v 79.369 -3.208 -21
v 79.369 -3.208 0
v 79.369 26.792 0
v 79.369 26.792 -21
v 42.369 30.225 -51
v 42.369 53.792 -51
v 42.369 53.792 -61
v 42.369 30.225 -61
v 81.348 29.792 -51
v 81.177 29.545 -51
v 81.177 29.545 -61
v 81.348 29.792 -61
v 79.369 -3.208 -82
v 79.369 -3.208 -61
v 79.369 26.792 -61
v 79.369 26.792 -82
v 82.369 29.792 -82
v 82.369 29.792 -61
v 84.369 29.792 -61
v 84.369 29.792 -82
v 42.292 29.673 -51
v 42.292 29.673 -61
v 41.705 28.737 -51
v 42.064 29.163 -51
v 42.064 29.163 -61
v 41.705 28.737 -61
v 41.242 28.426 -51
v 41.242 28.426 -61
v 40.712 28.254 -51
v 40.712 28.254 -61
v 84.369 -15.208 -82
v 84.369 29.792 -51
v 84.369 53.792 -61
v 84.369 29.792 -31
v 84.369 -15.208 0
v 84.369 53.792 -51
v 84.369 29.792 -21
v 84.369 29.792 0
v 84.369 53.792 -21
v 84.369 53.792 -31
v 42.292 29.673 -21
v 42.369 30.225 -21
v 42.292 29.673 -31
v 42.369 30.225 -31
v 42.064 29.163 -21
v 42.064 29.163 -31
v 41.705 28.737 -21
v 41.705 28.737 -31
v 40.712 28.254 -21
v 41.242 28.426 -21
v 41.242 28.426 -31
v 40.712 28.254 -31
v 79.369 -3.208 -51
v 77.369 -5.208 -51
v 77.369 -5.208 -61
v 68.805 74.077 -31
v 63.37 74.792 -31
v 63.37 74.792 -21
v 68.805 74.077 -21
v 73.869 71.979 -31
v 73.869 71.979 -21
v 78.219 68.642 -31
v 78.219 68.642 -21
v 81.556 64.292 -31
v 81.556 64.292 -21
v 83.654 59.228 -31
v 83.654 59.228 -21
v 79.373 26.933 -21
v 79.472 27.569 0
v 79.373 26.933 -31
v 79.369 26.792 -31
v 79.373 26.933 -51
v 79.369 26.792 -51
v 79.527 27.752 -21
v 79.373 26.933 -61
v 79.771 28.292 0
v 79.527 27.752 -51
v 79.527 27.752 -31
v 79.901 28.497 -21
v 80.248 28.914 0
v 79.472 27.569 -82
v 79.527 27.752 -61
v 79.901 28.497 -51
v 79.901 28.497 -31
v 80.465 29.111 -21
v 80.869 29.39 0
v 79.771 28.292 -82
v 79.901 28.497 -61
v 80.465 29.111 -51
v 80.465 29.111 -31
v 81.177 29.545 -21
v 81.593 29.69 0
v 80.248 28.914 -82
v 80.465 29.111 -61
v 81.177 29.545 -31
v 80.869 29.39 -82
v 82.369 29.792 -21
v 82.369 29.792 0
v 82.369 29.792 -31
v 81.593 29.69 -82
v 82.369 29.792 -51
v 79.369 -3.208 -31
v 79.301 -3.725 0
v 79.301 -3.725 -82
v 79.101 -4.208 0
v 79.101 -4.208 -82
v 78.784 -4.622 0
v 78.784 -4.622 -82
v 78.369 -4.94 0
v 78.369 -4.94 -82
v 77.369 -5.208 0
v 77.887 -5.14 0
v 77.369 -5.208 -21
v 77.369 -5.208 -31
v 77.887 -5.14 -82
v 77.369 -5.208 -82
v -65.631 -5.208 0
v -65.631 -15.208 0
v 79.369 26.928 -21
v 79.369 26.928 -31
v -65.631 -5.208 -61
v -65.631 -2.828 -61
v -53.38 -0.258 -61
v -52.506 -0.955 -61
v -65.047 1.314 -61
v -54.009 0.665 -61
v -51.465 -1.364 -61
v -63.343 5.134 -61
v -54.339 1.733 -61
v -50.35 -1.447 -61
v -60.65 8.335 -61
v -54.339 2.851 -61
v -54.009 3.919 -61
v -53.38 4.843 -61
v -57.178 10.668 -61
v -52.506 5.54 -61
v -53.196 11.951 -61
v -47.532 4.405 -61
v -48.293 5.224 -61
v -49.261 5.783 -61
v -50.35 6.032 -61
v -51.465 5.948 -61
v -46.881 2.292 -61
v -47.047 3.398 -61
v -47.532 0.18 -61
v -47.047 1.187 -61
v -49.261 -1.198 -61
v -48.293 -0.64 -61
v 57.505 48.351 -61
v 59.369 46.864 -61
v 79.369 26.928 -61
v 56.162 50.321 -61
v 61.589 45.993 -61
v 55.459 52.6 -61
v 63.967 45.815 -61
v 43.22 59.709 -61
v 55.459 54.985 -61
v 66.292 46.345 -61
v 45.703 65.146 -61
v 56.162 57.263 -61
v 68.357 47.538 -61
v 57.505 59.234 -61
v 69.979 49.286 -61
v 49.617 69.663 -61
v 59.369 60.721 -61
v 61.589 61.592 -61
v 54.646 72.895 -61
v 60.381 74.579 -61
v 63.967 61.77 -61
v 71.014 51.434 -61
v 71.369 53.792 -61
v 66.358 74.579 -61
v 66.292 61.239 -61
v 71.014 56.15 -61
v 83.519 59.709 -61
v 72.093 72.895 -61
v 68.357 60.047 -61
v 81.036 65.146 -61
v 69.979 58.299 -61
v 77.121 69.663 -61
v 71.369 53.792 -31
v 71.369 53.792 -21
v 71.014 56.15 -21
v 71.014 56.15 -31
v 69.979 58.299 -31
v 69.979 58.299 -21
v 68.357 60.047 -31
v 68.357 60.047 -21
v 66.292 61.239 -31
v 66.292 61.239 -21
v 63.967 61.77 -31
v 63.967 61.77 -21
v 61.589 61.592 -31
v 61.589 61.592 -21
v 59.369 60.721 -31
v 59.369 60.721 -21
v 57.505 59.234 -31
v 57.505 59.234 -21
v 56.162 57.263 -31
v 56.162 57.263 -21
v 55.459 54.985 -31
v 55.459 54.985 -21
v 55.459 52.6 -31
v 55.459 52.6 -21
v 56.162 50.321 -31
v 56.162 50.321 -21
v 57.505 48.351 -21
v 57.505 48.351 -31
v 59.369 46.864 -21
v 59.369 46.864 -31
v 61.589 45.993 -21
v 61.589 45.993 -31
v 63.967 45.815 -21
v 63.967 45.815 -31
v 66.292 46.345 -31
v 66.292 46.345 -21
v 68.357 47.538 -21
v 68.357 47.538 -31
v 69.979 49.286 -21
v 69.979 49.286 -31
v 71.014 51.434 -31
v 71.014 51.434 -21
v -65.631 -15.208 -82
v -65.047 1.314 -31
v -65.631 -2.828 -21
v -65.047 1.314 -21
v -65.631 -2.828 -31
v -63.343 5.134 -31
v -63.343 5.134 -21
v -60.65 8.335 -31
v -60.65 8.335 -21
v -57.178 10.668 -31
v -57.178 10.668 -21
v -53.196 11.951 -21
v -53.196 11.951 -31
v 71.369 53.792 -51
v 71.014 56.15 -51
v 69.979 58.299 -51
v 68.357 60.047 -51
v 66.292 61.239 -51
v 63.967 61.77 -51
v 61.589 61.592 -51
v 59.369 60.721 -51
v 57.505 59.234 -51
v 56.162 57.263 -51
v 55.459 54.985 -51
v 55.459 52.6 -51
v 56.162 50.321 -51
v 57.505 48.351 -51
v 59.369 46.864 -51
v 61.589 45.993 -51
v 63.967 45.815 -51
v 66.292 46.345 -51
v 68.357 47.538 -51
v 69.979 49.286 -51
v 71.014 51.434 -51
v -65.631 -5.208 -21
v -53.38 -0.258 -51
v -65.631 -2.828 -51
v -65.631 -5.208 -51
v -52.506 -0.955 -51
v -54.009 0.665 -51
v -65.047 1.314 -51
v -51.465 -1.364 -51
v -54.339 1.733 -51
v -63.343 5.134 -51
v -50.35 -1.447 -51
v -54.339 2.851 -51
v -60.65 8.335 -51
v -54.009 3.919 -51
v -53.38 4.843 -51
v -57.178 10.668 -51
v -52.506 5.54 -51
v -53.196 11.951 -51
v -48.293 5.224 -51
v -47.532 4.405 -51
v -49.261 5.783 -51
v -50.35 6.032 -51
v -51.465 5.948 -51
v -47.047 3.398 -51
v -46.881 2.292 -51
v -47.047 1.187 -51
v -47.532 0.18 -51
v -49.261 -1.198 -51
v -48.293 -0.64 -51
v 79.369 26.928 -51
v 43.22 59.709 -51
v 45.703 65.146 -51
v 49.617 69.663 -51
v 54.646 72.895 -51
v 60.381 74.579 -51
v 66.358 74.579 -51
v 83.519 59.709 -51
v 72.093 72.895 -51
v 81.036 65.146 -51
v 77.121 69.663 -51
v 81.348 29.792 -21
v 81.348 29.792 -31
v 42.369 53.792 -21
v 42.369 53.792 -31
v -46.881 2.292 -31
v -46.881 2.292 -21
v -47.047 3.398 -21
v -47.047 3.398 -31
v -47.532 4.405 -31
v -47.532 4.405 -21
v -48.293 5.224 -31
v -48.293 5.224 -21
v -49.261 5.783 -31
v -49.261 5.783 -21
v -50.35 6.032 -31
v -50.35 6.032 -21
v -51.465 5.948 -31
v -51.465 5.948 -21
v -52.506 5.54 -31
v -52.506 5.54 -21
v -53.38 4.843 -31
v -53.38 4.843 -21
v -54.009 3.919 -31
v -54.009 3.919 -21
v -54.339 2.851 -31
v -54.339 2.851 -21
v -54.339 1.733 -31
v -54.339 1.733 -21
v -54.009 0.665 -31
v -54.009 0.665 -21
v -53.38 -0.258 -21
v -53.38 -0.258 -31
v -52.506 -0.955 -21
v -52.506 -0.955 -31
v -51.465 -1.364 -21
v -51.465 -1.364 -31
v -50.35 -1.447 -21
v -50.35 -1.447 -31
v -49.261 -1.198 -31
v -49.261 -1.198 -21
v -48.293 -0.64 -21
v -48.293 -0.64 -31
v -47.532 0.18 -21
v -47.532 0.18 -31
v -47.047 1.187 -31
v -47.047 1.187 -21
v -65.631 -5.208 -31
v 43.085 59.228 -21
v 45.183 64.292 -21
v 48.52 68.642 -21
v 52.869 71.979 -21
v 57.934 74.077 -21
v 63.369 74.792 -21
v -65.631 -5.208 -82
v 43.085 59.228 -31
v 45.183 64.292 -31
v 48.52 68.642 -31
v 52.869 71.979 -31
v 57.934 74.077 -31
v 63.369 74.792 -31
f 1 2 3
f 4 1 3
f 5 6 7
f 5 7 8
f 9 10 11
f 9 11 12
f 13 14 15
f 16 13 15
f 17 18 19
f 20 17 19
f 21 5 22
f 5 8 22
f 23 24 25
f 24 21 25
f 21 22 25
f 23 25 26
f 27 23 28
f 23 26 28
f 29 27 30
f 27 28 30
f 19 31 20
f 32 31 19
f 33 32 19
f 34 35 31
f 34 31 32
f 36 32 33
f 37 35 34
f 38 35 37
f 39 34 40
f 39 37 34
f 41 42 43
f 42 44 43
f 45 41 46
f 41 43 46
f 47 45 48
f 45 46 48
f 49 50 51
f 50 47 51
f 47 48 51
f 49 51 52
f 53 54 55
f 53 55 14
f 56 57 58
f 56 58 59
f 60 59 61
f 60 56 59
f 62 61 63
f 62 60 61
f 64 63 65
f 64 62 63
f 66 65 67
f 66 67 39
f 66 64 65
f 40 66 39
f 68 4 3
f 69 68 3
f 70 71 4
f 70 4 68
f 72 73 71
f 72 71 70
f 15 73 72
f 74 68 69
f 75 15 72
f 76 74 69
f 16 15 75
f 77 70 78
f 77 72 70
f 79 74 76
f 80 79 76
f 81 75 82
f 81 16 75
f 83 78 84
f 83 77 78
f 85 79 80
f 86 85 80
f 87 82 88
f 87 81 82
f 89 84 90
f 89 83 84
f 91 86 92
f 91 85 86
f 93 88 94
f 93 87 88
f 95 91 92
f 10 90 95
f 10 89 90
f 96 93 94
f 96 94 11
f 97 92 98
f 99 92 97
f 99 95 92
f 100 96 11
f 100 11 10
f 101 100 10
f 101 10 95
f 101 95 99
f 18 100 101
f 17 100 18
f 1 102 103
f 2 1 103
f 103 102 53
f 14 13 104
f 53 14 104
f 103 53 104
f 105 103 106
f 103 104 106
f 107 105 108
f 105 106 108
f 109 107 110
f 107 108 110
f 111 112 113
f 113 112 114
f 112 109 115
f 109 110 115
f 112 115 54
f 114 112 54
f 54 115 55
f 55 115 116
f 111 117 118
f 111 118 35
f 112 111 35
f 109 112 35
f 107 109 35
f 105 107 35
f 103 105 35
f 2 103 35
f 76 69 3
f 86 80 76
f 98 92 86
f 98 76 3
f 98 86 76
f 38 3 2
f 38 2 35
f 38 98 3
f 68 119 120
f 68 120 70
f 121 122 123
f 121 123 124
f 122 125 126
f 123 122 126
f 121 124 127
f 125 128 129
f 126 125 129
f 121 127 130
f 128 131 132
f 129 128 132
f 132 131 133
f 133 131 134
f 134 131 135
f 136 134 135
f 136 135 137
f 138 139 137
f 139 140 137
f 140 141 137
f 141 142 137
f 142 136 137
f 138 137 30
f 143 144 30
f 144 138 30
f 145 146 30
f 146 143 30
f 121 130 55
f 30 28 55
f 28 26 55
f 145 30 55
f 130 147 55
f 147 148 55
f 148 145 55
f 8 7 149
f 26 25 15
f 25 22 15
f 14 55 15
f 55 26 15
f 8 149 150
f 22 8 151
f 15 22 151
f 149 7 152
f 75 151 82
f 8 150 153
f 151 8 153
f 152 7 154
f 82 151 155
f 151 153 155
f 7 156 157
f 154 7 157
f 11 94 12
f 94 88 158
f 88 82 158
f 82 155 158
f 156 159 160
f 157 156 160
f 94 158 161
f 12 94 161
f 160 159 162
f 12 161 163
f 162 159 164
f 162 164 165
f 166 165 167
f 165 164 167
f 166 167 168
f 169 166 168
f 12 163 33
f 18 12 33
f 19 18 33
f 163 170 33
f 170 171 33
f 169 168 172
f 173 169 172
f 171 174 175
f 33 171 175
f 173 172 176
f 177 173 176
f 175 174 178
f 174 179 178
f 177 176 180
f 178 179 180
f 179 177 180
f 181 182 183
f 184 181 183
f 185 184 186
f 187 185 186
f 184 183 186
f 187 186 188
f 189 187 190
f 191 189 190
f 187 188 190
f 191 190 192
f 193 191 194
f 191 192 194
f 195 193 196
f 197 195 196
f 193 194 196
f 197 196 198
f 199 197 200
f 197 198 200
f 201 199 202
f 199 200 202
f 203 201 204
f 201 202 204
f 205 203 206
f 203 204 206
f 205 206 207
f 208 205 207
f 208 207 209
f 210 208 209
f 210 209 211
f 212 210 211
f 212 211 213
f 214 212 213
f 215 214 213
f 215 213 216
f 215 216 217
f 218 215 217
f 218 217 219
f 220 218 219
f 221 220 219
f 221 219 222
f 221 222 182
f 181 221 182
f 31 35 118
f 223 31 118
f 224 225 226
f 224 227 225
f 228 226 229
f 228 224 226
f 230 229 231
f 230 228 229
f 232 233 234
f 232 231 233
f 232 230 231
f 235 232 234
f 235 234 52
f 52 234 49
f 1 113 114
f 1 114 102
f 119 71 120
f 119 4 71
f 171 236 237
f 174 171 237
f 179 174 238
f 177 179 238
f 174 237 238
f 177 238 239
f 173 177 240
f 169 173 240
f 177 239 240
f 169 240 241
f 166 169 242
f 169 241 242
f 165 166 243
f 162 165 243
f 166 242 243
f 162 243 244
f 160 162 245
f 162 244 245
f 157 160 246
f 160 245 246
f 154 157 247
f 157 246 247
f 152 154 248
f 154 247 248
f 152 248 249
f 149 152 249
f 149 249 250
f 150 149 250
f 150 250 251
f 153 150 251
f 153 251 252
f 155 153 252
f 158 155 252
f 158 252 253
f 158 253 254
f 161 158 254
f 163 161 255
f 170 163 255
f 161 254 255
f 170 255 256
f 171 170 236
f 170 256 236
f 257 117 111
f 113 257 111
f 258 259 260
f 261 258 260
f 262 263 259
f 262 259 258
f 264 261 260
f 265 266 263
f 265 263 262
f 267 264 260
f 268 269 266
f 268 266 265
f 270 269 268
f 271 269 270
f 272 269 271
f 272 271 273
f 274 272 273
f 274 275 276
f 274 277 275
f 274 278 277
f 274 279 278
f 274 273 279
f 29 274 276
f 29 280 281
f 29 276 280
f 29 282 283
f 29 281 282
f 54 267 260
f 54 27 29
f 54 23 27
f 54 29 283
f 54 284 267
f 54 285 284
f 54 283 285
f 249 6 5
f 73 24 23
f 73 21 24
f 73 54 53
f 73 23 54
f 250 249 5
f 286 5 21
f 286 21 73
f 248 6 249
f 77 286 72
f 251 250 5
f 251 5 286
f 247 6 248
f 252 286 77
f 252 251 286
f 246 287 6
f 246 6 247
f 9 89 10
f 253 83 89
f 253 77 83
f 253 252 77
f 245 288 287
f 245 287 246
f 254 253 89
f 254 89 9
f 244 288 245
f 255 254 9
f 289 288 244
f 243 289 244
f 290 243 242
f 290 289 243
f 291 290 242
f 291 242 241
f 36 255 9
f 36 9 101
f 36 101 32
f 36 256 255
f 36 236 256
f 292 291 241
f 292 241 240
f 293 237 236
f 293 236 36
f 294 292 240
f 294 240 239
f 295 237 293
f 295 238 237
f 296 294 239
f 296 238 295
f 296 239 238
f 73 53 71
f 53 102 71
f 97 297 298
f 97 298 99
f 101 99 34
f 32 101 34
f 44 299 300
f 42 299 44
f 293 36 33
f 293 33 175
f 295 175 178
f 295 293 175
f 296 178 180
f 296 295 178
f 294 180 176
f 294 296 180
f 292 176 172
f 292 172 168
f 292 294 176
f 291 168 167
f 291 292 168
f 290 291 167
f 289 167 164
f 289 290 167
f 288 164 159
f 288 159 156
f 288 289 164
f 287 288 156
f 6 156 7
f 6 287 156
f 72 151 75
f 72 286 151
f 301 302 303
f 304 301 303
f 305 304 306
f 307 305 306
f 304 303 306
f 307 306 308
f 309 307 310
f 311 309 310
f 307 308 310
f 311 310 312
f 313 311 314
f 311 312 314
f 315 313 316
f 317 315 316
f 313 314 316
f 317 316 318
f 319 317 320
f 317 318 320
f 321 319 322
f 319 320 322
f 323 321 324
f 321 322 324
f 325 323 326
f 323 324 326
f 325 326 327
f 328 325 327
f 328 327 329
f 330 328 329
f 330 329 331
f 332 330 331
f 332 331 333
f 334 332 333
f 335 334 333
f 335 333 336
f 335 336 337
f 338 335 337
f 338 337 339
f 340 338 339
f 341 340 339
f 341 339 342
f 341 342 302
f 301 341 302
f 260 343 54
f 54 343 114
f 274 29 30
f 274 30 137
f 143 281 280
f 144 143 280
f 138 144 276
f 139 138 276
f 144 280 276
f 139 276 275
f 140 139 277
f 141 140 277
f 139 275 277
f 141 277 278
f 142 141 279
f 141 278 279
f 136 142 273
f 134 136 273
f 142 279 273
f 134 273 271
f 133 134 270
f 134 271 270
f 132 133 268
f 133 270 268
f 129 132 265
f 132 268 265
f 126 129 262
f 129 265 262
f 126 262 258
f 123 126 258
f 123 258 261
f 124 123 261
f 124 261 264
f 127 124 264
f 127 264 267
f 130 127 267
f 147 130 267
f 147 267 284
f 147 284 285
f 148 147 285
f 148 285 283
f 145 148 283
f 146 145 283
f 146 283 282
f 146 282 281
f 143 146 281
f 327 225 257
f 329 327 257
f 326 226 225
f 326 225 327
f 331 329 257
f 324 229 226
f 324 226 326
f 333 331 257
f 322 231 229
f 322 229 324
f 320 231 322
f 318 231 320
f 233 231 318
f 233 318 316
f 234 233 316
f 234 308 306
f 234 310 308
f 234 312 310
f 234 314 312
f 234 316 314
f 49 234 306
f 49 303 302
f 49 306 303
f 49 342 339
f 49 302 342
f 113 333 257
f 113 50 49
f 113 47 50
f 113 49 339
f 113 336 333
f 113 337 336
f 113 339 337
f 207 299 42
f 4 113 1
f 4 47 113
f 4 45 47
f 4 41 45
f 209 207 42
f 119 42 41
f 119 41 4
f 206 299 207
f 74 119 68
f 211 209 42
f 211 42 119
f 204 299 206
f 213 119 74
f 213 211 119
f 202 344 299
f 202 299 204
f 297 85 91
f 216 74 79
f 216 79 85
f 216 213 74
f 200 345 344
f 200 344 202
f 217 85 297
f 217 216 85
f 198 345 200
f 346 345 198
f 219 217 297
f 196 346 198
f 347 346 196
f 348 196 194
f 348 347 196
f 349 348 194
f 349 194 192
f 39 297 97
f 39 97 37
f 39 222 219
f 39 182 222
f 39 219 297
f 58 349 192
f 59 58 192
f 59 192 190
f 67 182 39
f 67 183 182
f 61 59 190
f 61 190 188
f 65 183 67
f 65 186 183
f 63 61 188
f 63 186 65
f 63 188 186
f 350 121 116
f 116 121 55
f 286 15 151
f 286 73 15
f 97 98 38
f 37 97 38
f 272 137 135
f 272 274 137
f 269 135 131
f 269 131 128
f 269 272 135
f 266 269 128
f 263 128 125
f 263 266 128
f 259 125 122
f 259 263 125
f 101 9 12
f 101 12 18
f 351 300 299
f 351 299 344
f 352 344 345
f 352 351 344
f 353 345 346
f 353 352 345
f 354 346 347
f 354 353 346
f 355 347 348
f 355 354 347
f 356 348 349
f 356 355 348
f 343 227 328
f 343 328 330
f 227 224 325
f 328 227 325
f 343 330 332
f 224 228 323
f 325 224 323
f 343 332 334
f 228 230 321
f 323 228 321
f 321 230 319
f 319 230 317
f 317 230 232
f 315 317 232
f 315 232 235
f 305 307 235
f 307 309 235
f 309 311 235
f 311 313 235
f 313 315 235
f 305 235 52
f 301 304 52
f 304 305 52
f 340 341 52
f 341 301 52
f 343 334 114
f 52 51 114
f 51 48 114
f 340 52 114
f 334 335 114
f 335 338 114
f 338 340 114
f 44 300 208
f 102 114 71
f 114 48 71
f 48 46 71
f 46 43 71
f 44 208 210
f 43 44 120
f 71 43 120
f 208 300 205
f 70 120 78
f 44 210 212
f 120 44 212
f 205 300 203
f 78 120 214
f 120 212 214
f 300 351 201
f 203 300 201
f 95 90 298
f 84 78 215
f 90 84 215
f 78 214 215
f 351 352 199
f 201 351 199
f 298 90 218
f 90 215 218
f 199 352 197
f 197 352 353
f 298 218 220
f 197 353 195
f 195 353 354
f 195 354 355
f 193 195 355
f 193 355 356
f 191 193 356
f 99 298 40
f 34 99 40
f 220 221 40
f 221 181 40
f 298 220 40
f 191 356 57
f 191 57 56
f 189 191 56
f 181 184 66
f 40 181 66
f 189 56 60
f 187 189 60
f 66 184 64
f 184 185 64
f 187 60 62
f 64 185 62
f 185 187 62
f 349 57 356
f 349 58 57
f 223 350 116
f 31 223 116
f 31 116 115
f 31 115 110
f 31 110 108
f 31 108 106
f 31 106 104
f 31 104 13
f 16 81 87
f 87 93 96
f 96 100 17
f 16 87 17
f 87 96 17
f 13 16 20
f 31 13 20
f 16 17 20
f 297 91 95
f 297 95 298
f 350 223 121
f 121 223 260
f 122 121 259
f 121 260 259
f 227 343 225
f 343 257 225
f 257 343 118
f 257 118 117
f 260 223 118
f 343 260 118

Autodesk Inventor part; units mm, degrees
ref_plane "YZ Plane" through (0, 0, 0) normal (1, 0, 0) x (0, 1, 0)
ref_plane "XZ Plane" through (0, 0, 0) normal (0, 1, 0) x (-1, 0, 0)
sketch "Sketch1" plane through (0, 0, 0) normal (0, 0, 1) x (1, 0, 0)
  line L0 (79.3694, 29.7923) -> (84.3694, 29.7923)
  line L1 (84.3694, 29.7923) -> (84.3694, -15.2077)
  line L2 (84.3694, -15.2077) -> (-65.6306, -15.2077)
  line L3 (-65.6306, -15.2077) -> (-65.6306, -5.2077)
  line L4 (-65.6306, -5.2077) -> (79.3694, -5.2077)
  line L5 (79.3694, -5.2077) -> (79.3694, 29.7923)
  line L6 (79.3694, 29.7923) -> (84.3694, 29.7923)
  point P0 (0, 0)
  dimension "d0" = 45
  dimension "d1" = 150
  dimension "d2" = 10
  dimension "d3" = 5
extrude "Extrusion1" add sketch "Sketch1" against normal blind 82
fillet "Fillet1" radius 3 1 edges at (79.3694, 29.7923, -41)
fillet "Fillet2" radius 2 1 edges at (79.3694, -5.2077, -41)
ref_plane "Work Plane1" through (0, 0, -21) normal (0, 0, 1) x (1, 0, 0)
sketch "Sketch2" plane through (0, 0, -21) normal (0, 0, 1) x (1, 0, 0)
  point P0 (0, 0)
sketch "Sketch3" plane through (0, 0, -21) normal (0, 0, 1) x (1, 0, 0)
  line L0 (-65.6306, -15.2077) -> (-65.6306, -5.2077) projected
  line L1 (-65.6306, -5.2077) -> (-65.6306, 9.7923)
  line L2 (-65.6306, 9.7923) -> (42.3694, 28.5423)
  line L3 (-65.6306, -5.2077) -> (77.3694, -5.2077) projected
  line L4 (54.3694, -5.2077) -> (84.3564, -5.2077)
  arc A0 (77.3694, -5.2077) -> (79.3694, -3.2077) centre (77.3694, -3.2077) ccw projected
  line L5 (77.3694, -5.2077) -> (79.3694, -3.2077)
  line L6 (79.3694, -3.2077) -> (79.3694, 26.9279)
  line L7 (79.3694, 26.9279) -> (81.3477, 29.7923)
  line L8 (81.3477, 29.7923) -> (82.0785, 29.7923)
  line L9 (82.3694, 29.7923) -> (84.3694, 29.7923) projected
  line L10 (82.0785, 29.7923) -> (84.3694, 29.7923)
  line L11 (84.3694, 29.7923) -> (84.3694, 74.7923)
  line L12 (84.3694, 74.7923) -> (42.3694, 74.7923)
  line L13 (42.3694, 74.7923) -> (42.3694, 28.5423)
  point P0 (0, 0)
  point P1 (77.3694, -5.2077)
  dimension "d9" = 15
  dimension "d12" = 108
  dimension "d13" = 25
  dimension "d21" = 45
  dimension "d23" = 42
extrude "Extrusion2" add sketch "Sketch3" against normal blind 10 contours L1 L2 L13 L12 L11 L9 L10 L8 L7 L6 L5 L3
fillet "Fillet4" radius 21 2 edges at (84.3694, 74.7923, -26) (42.3694, 74.7923, -26)
fillet "Fillet5" radius 15 1 edges at (-65.6306, 9.7923, -26)
sketch "Sketch4" plane through (0, 0, -21) normal (0, 0, 1) x (1, 0, 0)
  point P0 (0, 0)
ref_plane "Work Plane3" through (0, 0, -51) normal (0, 0, 1) x (1, 0, 0)
sketch "Sketch6" plane through (0, 0, -51) normal (0, 0, 1) x (1, 0, 0)
  line L0 (77.3694, -5.2077) -> (-65.6306, -5.2077) projected
  arc A0 (-53.1963, 11.951) -> (-65.6306, -2.8279) centre (-50.6306, -2.8279) ccw projected
  line L1 (-65.6306, -2.8279) -> (-65.6306, -5.2077) projected
  line L2 (77.3694, -5.2077) -> (-65.6306, -5.2077) projected
  line L3 (77.3694, -5.2077) -> (79.3694, -3.2077) projected
  line L4 (79.3694, 26.7923) -> (79.3694, -3.2077) projected
  line L5 (79.3694, 26.7923) -> (79.3694, 26.9279) projected
  line L6 (79.3694, 26.9279) -> (79.3727, 26.9326) projected
  arc A1 (81.1769, 29.5451) -> (79.3727, 26.9326) centre (82.3694, 26.7923) ccw projected
  line L7 (81.1769, 29.5451) -> (81.3477, 29.7923) projected
  line L8 (81.3477, 29.7923) -> (82.3694, 29.7923) projected
  line L9 (84.3694, 29.7923) -> (82.3694, 29.7923) projected
  line L10 (84.3694, 29.7923) -> (84.3694, 53.7923) projected
  arc A2 (84.3694, 53.7923) -> (42.3694, 53.7923) centre (63.3694, 53.7923) ccw projected
  line L11 (42.3694, 53.7923) -> (42.3694, 28.5423) projected
  line L12 (42.3694, 28.5423) -> (-53.1963, 11.951) projected
  point P0 (0, 0)
extrude "Extrusion3" add sketch "Sketch6" against normal blind 10
sketch "Sketch7" plane through (0, 0, -21) normal (0, 0, 1) x (1, 0, 0)
  line L0 (-65.6306, -5.2077) -> (77.3694, -5.2077) projected
  line L1 (-65.6306, -5.2077) -> (77.3694, -5.2077) projected
  line L2 (-53.1963, 11.951) -> (42.3694, 28.5423) projected
  arc A0 (-53.1963, 11.951) -> (-65.6306, -2.8279) centre (-50.6306, -2.8279) ccw projected
  circle A1 centre (-50.6306, 2.2923) radius 3.75
  line L3 (42.3694, 53.7923) -> (42.3694, 28.5423) projected
  arc A2 (84.3694, 53.7923) -> (42.3694, 53.7923) centre (63.3694, 53.7923) ccw projected
  circle A3 centre (63.3694, 53.7923) radius 8
  point P0 (0, 0)
  point P1 (-50.6306, -5.2077)
  dimension "d29" = 15
  dimension "d30" = 7.5
  dimension "d31" = 7.5
  dimension "d34" = 16
extrude "Extrusion4" cut sketch "Sketch7" against normal blind 40 contours A1
sketch "Sketch8" plane through (0, 0, -21) normal (0, 0, 1) x (1, 0, 0)
  arc A0 (84.3694, 53.7923) -> (42.3694, 53.7923) centre (63.3694, 53.7923) ccw projected
  circle A1 centre (63.3694, 53.7923) radius 8
  point P0 (0, 0)
  dimension "d35" = 16
extrude "Extrusion5" cut sketch "Sketch8" against normal blind 40
fillet "Fillet6" radius 2 2 edges at (42.3694, 28.5423, -26) (42.3694, 28.5423, -56)
